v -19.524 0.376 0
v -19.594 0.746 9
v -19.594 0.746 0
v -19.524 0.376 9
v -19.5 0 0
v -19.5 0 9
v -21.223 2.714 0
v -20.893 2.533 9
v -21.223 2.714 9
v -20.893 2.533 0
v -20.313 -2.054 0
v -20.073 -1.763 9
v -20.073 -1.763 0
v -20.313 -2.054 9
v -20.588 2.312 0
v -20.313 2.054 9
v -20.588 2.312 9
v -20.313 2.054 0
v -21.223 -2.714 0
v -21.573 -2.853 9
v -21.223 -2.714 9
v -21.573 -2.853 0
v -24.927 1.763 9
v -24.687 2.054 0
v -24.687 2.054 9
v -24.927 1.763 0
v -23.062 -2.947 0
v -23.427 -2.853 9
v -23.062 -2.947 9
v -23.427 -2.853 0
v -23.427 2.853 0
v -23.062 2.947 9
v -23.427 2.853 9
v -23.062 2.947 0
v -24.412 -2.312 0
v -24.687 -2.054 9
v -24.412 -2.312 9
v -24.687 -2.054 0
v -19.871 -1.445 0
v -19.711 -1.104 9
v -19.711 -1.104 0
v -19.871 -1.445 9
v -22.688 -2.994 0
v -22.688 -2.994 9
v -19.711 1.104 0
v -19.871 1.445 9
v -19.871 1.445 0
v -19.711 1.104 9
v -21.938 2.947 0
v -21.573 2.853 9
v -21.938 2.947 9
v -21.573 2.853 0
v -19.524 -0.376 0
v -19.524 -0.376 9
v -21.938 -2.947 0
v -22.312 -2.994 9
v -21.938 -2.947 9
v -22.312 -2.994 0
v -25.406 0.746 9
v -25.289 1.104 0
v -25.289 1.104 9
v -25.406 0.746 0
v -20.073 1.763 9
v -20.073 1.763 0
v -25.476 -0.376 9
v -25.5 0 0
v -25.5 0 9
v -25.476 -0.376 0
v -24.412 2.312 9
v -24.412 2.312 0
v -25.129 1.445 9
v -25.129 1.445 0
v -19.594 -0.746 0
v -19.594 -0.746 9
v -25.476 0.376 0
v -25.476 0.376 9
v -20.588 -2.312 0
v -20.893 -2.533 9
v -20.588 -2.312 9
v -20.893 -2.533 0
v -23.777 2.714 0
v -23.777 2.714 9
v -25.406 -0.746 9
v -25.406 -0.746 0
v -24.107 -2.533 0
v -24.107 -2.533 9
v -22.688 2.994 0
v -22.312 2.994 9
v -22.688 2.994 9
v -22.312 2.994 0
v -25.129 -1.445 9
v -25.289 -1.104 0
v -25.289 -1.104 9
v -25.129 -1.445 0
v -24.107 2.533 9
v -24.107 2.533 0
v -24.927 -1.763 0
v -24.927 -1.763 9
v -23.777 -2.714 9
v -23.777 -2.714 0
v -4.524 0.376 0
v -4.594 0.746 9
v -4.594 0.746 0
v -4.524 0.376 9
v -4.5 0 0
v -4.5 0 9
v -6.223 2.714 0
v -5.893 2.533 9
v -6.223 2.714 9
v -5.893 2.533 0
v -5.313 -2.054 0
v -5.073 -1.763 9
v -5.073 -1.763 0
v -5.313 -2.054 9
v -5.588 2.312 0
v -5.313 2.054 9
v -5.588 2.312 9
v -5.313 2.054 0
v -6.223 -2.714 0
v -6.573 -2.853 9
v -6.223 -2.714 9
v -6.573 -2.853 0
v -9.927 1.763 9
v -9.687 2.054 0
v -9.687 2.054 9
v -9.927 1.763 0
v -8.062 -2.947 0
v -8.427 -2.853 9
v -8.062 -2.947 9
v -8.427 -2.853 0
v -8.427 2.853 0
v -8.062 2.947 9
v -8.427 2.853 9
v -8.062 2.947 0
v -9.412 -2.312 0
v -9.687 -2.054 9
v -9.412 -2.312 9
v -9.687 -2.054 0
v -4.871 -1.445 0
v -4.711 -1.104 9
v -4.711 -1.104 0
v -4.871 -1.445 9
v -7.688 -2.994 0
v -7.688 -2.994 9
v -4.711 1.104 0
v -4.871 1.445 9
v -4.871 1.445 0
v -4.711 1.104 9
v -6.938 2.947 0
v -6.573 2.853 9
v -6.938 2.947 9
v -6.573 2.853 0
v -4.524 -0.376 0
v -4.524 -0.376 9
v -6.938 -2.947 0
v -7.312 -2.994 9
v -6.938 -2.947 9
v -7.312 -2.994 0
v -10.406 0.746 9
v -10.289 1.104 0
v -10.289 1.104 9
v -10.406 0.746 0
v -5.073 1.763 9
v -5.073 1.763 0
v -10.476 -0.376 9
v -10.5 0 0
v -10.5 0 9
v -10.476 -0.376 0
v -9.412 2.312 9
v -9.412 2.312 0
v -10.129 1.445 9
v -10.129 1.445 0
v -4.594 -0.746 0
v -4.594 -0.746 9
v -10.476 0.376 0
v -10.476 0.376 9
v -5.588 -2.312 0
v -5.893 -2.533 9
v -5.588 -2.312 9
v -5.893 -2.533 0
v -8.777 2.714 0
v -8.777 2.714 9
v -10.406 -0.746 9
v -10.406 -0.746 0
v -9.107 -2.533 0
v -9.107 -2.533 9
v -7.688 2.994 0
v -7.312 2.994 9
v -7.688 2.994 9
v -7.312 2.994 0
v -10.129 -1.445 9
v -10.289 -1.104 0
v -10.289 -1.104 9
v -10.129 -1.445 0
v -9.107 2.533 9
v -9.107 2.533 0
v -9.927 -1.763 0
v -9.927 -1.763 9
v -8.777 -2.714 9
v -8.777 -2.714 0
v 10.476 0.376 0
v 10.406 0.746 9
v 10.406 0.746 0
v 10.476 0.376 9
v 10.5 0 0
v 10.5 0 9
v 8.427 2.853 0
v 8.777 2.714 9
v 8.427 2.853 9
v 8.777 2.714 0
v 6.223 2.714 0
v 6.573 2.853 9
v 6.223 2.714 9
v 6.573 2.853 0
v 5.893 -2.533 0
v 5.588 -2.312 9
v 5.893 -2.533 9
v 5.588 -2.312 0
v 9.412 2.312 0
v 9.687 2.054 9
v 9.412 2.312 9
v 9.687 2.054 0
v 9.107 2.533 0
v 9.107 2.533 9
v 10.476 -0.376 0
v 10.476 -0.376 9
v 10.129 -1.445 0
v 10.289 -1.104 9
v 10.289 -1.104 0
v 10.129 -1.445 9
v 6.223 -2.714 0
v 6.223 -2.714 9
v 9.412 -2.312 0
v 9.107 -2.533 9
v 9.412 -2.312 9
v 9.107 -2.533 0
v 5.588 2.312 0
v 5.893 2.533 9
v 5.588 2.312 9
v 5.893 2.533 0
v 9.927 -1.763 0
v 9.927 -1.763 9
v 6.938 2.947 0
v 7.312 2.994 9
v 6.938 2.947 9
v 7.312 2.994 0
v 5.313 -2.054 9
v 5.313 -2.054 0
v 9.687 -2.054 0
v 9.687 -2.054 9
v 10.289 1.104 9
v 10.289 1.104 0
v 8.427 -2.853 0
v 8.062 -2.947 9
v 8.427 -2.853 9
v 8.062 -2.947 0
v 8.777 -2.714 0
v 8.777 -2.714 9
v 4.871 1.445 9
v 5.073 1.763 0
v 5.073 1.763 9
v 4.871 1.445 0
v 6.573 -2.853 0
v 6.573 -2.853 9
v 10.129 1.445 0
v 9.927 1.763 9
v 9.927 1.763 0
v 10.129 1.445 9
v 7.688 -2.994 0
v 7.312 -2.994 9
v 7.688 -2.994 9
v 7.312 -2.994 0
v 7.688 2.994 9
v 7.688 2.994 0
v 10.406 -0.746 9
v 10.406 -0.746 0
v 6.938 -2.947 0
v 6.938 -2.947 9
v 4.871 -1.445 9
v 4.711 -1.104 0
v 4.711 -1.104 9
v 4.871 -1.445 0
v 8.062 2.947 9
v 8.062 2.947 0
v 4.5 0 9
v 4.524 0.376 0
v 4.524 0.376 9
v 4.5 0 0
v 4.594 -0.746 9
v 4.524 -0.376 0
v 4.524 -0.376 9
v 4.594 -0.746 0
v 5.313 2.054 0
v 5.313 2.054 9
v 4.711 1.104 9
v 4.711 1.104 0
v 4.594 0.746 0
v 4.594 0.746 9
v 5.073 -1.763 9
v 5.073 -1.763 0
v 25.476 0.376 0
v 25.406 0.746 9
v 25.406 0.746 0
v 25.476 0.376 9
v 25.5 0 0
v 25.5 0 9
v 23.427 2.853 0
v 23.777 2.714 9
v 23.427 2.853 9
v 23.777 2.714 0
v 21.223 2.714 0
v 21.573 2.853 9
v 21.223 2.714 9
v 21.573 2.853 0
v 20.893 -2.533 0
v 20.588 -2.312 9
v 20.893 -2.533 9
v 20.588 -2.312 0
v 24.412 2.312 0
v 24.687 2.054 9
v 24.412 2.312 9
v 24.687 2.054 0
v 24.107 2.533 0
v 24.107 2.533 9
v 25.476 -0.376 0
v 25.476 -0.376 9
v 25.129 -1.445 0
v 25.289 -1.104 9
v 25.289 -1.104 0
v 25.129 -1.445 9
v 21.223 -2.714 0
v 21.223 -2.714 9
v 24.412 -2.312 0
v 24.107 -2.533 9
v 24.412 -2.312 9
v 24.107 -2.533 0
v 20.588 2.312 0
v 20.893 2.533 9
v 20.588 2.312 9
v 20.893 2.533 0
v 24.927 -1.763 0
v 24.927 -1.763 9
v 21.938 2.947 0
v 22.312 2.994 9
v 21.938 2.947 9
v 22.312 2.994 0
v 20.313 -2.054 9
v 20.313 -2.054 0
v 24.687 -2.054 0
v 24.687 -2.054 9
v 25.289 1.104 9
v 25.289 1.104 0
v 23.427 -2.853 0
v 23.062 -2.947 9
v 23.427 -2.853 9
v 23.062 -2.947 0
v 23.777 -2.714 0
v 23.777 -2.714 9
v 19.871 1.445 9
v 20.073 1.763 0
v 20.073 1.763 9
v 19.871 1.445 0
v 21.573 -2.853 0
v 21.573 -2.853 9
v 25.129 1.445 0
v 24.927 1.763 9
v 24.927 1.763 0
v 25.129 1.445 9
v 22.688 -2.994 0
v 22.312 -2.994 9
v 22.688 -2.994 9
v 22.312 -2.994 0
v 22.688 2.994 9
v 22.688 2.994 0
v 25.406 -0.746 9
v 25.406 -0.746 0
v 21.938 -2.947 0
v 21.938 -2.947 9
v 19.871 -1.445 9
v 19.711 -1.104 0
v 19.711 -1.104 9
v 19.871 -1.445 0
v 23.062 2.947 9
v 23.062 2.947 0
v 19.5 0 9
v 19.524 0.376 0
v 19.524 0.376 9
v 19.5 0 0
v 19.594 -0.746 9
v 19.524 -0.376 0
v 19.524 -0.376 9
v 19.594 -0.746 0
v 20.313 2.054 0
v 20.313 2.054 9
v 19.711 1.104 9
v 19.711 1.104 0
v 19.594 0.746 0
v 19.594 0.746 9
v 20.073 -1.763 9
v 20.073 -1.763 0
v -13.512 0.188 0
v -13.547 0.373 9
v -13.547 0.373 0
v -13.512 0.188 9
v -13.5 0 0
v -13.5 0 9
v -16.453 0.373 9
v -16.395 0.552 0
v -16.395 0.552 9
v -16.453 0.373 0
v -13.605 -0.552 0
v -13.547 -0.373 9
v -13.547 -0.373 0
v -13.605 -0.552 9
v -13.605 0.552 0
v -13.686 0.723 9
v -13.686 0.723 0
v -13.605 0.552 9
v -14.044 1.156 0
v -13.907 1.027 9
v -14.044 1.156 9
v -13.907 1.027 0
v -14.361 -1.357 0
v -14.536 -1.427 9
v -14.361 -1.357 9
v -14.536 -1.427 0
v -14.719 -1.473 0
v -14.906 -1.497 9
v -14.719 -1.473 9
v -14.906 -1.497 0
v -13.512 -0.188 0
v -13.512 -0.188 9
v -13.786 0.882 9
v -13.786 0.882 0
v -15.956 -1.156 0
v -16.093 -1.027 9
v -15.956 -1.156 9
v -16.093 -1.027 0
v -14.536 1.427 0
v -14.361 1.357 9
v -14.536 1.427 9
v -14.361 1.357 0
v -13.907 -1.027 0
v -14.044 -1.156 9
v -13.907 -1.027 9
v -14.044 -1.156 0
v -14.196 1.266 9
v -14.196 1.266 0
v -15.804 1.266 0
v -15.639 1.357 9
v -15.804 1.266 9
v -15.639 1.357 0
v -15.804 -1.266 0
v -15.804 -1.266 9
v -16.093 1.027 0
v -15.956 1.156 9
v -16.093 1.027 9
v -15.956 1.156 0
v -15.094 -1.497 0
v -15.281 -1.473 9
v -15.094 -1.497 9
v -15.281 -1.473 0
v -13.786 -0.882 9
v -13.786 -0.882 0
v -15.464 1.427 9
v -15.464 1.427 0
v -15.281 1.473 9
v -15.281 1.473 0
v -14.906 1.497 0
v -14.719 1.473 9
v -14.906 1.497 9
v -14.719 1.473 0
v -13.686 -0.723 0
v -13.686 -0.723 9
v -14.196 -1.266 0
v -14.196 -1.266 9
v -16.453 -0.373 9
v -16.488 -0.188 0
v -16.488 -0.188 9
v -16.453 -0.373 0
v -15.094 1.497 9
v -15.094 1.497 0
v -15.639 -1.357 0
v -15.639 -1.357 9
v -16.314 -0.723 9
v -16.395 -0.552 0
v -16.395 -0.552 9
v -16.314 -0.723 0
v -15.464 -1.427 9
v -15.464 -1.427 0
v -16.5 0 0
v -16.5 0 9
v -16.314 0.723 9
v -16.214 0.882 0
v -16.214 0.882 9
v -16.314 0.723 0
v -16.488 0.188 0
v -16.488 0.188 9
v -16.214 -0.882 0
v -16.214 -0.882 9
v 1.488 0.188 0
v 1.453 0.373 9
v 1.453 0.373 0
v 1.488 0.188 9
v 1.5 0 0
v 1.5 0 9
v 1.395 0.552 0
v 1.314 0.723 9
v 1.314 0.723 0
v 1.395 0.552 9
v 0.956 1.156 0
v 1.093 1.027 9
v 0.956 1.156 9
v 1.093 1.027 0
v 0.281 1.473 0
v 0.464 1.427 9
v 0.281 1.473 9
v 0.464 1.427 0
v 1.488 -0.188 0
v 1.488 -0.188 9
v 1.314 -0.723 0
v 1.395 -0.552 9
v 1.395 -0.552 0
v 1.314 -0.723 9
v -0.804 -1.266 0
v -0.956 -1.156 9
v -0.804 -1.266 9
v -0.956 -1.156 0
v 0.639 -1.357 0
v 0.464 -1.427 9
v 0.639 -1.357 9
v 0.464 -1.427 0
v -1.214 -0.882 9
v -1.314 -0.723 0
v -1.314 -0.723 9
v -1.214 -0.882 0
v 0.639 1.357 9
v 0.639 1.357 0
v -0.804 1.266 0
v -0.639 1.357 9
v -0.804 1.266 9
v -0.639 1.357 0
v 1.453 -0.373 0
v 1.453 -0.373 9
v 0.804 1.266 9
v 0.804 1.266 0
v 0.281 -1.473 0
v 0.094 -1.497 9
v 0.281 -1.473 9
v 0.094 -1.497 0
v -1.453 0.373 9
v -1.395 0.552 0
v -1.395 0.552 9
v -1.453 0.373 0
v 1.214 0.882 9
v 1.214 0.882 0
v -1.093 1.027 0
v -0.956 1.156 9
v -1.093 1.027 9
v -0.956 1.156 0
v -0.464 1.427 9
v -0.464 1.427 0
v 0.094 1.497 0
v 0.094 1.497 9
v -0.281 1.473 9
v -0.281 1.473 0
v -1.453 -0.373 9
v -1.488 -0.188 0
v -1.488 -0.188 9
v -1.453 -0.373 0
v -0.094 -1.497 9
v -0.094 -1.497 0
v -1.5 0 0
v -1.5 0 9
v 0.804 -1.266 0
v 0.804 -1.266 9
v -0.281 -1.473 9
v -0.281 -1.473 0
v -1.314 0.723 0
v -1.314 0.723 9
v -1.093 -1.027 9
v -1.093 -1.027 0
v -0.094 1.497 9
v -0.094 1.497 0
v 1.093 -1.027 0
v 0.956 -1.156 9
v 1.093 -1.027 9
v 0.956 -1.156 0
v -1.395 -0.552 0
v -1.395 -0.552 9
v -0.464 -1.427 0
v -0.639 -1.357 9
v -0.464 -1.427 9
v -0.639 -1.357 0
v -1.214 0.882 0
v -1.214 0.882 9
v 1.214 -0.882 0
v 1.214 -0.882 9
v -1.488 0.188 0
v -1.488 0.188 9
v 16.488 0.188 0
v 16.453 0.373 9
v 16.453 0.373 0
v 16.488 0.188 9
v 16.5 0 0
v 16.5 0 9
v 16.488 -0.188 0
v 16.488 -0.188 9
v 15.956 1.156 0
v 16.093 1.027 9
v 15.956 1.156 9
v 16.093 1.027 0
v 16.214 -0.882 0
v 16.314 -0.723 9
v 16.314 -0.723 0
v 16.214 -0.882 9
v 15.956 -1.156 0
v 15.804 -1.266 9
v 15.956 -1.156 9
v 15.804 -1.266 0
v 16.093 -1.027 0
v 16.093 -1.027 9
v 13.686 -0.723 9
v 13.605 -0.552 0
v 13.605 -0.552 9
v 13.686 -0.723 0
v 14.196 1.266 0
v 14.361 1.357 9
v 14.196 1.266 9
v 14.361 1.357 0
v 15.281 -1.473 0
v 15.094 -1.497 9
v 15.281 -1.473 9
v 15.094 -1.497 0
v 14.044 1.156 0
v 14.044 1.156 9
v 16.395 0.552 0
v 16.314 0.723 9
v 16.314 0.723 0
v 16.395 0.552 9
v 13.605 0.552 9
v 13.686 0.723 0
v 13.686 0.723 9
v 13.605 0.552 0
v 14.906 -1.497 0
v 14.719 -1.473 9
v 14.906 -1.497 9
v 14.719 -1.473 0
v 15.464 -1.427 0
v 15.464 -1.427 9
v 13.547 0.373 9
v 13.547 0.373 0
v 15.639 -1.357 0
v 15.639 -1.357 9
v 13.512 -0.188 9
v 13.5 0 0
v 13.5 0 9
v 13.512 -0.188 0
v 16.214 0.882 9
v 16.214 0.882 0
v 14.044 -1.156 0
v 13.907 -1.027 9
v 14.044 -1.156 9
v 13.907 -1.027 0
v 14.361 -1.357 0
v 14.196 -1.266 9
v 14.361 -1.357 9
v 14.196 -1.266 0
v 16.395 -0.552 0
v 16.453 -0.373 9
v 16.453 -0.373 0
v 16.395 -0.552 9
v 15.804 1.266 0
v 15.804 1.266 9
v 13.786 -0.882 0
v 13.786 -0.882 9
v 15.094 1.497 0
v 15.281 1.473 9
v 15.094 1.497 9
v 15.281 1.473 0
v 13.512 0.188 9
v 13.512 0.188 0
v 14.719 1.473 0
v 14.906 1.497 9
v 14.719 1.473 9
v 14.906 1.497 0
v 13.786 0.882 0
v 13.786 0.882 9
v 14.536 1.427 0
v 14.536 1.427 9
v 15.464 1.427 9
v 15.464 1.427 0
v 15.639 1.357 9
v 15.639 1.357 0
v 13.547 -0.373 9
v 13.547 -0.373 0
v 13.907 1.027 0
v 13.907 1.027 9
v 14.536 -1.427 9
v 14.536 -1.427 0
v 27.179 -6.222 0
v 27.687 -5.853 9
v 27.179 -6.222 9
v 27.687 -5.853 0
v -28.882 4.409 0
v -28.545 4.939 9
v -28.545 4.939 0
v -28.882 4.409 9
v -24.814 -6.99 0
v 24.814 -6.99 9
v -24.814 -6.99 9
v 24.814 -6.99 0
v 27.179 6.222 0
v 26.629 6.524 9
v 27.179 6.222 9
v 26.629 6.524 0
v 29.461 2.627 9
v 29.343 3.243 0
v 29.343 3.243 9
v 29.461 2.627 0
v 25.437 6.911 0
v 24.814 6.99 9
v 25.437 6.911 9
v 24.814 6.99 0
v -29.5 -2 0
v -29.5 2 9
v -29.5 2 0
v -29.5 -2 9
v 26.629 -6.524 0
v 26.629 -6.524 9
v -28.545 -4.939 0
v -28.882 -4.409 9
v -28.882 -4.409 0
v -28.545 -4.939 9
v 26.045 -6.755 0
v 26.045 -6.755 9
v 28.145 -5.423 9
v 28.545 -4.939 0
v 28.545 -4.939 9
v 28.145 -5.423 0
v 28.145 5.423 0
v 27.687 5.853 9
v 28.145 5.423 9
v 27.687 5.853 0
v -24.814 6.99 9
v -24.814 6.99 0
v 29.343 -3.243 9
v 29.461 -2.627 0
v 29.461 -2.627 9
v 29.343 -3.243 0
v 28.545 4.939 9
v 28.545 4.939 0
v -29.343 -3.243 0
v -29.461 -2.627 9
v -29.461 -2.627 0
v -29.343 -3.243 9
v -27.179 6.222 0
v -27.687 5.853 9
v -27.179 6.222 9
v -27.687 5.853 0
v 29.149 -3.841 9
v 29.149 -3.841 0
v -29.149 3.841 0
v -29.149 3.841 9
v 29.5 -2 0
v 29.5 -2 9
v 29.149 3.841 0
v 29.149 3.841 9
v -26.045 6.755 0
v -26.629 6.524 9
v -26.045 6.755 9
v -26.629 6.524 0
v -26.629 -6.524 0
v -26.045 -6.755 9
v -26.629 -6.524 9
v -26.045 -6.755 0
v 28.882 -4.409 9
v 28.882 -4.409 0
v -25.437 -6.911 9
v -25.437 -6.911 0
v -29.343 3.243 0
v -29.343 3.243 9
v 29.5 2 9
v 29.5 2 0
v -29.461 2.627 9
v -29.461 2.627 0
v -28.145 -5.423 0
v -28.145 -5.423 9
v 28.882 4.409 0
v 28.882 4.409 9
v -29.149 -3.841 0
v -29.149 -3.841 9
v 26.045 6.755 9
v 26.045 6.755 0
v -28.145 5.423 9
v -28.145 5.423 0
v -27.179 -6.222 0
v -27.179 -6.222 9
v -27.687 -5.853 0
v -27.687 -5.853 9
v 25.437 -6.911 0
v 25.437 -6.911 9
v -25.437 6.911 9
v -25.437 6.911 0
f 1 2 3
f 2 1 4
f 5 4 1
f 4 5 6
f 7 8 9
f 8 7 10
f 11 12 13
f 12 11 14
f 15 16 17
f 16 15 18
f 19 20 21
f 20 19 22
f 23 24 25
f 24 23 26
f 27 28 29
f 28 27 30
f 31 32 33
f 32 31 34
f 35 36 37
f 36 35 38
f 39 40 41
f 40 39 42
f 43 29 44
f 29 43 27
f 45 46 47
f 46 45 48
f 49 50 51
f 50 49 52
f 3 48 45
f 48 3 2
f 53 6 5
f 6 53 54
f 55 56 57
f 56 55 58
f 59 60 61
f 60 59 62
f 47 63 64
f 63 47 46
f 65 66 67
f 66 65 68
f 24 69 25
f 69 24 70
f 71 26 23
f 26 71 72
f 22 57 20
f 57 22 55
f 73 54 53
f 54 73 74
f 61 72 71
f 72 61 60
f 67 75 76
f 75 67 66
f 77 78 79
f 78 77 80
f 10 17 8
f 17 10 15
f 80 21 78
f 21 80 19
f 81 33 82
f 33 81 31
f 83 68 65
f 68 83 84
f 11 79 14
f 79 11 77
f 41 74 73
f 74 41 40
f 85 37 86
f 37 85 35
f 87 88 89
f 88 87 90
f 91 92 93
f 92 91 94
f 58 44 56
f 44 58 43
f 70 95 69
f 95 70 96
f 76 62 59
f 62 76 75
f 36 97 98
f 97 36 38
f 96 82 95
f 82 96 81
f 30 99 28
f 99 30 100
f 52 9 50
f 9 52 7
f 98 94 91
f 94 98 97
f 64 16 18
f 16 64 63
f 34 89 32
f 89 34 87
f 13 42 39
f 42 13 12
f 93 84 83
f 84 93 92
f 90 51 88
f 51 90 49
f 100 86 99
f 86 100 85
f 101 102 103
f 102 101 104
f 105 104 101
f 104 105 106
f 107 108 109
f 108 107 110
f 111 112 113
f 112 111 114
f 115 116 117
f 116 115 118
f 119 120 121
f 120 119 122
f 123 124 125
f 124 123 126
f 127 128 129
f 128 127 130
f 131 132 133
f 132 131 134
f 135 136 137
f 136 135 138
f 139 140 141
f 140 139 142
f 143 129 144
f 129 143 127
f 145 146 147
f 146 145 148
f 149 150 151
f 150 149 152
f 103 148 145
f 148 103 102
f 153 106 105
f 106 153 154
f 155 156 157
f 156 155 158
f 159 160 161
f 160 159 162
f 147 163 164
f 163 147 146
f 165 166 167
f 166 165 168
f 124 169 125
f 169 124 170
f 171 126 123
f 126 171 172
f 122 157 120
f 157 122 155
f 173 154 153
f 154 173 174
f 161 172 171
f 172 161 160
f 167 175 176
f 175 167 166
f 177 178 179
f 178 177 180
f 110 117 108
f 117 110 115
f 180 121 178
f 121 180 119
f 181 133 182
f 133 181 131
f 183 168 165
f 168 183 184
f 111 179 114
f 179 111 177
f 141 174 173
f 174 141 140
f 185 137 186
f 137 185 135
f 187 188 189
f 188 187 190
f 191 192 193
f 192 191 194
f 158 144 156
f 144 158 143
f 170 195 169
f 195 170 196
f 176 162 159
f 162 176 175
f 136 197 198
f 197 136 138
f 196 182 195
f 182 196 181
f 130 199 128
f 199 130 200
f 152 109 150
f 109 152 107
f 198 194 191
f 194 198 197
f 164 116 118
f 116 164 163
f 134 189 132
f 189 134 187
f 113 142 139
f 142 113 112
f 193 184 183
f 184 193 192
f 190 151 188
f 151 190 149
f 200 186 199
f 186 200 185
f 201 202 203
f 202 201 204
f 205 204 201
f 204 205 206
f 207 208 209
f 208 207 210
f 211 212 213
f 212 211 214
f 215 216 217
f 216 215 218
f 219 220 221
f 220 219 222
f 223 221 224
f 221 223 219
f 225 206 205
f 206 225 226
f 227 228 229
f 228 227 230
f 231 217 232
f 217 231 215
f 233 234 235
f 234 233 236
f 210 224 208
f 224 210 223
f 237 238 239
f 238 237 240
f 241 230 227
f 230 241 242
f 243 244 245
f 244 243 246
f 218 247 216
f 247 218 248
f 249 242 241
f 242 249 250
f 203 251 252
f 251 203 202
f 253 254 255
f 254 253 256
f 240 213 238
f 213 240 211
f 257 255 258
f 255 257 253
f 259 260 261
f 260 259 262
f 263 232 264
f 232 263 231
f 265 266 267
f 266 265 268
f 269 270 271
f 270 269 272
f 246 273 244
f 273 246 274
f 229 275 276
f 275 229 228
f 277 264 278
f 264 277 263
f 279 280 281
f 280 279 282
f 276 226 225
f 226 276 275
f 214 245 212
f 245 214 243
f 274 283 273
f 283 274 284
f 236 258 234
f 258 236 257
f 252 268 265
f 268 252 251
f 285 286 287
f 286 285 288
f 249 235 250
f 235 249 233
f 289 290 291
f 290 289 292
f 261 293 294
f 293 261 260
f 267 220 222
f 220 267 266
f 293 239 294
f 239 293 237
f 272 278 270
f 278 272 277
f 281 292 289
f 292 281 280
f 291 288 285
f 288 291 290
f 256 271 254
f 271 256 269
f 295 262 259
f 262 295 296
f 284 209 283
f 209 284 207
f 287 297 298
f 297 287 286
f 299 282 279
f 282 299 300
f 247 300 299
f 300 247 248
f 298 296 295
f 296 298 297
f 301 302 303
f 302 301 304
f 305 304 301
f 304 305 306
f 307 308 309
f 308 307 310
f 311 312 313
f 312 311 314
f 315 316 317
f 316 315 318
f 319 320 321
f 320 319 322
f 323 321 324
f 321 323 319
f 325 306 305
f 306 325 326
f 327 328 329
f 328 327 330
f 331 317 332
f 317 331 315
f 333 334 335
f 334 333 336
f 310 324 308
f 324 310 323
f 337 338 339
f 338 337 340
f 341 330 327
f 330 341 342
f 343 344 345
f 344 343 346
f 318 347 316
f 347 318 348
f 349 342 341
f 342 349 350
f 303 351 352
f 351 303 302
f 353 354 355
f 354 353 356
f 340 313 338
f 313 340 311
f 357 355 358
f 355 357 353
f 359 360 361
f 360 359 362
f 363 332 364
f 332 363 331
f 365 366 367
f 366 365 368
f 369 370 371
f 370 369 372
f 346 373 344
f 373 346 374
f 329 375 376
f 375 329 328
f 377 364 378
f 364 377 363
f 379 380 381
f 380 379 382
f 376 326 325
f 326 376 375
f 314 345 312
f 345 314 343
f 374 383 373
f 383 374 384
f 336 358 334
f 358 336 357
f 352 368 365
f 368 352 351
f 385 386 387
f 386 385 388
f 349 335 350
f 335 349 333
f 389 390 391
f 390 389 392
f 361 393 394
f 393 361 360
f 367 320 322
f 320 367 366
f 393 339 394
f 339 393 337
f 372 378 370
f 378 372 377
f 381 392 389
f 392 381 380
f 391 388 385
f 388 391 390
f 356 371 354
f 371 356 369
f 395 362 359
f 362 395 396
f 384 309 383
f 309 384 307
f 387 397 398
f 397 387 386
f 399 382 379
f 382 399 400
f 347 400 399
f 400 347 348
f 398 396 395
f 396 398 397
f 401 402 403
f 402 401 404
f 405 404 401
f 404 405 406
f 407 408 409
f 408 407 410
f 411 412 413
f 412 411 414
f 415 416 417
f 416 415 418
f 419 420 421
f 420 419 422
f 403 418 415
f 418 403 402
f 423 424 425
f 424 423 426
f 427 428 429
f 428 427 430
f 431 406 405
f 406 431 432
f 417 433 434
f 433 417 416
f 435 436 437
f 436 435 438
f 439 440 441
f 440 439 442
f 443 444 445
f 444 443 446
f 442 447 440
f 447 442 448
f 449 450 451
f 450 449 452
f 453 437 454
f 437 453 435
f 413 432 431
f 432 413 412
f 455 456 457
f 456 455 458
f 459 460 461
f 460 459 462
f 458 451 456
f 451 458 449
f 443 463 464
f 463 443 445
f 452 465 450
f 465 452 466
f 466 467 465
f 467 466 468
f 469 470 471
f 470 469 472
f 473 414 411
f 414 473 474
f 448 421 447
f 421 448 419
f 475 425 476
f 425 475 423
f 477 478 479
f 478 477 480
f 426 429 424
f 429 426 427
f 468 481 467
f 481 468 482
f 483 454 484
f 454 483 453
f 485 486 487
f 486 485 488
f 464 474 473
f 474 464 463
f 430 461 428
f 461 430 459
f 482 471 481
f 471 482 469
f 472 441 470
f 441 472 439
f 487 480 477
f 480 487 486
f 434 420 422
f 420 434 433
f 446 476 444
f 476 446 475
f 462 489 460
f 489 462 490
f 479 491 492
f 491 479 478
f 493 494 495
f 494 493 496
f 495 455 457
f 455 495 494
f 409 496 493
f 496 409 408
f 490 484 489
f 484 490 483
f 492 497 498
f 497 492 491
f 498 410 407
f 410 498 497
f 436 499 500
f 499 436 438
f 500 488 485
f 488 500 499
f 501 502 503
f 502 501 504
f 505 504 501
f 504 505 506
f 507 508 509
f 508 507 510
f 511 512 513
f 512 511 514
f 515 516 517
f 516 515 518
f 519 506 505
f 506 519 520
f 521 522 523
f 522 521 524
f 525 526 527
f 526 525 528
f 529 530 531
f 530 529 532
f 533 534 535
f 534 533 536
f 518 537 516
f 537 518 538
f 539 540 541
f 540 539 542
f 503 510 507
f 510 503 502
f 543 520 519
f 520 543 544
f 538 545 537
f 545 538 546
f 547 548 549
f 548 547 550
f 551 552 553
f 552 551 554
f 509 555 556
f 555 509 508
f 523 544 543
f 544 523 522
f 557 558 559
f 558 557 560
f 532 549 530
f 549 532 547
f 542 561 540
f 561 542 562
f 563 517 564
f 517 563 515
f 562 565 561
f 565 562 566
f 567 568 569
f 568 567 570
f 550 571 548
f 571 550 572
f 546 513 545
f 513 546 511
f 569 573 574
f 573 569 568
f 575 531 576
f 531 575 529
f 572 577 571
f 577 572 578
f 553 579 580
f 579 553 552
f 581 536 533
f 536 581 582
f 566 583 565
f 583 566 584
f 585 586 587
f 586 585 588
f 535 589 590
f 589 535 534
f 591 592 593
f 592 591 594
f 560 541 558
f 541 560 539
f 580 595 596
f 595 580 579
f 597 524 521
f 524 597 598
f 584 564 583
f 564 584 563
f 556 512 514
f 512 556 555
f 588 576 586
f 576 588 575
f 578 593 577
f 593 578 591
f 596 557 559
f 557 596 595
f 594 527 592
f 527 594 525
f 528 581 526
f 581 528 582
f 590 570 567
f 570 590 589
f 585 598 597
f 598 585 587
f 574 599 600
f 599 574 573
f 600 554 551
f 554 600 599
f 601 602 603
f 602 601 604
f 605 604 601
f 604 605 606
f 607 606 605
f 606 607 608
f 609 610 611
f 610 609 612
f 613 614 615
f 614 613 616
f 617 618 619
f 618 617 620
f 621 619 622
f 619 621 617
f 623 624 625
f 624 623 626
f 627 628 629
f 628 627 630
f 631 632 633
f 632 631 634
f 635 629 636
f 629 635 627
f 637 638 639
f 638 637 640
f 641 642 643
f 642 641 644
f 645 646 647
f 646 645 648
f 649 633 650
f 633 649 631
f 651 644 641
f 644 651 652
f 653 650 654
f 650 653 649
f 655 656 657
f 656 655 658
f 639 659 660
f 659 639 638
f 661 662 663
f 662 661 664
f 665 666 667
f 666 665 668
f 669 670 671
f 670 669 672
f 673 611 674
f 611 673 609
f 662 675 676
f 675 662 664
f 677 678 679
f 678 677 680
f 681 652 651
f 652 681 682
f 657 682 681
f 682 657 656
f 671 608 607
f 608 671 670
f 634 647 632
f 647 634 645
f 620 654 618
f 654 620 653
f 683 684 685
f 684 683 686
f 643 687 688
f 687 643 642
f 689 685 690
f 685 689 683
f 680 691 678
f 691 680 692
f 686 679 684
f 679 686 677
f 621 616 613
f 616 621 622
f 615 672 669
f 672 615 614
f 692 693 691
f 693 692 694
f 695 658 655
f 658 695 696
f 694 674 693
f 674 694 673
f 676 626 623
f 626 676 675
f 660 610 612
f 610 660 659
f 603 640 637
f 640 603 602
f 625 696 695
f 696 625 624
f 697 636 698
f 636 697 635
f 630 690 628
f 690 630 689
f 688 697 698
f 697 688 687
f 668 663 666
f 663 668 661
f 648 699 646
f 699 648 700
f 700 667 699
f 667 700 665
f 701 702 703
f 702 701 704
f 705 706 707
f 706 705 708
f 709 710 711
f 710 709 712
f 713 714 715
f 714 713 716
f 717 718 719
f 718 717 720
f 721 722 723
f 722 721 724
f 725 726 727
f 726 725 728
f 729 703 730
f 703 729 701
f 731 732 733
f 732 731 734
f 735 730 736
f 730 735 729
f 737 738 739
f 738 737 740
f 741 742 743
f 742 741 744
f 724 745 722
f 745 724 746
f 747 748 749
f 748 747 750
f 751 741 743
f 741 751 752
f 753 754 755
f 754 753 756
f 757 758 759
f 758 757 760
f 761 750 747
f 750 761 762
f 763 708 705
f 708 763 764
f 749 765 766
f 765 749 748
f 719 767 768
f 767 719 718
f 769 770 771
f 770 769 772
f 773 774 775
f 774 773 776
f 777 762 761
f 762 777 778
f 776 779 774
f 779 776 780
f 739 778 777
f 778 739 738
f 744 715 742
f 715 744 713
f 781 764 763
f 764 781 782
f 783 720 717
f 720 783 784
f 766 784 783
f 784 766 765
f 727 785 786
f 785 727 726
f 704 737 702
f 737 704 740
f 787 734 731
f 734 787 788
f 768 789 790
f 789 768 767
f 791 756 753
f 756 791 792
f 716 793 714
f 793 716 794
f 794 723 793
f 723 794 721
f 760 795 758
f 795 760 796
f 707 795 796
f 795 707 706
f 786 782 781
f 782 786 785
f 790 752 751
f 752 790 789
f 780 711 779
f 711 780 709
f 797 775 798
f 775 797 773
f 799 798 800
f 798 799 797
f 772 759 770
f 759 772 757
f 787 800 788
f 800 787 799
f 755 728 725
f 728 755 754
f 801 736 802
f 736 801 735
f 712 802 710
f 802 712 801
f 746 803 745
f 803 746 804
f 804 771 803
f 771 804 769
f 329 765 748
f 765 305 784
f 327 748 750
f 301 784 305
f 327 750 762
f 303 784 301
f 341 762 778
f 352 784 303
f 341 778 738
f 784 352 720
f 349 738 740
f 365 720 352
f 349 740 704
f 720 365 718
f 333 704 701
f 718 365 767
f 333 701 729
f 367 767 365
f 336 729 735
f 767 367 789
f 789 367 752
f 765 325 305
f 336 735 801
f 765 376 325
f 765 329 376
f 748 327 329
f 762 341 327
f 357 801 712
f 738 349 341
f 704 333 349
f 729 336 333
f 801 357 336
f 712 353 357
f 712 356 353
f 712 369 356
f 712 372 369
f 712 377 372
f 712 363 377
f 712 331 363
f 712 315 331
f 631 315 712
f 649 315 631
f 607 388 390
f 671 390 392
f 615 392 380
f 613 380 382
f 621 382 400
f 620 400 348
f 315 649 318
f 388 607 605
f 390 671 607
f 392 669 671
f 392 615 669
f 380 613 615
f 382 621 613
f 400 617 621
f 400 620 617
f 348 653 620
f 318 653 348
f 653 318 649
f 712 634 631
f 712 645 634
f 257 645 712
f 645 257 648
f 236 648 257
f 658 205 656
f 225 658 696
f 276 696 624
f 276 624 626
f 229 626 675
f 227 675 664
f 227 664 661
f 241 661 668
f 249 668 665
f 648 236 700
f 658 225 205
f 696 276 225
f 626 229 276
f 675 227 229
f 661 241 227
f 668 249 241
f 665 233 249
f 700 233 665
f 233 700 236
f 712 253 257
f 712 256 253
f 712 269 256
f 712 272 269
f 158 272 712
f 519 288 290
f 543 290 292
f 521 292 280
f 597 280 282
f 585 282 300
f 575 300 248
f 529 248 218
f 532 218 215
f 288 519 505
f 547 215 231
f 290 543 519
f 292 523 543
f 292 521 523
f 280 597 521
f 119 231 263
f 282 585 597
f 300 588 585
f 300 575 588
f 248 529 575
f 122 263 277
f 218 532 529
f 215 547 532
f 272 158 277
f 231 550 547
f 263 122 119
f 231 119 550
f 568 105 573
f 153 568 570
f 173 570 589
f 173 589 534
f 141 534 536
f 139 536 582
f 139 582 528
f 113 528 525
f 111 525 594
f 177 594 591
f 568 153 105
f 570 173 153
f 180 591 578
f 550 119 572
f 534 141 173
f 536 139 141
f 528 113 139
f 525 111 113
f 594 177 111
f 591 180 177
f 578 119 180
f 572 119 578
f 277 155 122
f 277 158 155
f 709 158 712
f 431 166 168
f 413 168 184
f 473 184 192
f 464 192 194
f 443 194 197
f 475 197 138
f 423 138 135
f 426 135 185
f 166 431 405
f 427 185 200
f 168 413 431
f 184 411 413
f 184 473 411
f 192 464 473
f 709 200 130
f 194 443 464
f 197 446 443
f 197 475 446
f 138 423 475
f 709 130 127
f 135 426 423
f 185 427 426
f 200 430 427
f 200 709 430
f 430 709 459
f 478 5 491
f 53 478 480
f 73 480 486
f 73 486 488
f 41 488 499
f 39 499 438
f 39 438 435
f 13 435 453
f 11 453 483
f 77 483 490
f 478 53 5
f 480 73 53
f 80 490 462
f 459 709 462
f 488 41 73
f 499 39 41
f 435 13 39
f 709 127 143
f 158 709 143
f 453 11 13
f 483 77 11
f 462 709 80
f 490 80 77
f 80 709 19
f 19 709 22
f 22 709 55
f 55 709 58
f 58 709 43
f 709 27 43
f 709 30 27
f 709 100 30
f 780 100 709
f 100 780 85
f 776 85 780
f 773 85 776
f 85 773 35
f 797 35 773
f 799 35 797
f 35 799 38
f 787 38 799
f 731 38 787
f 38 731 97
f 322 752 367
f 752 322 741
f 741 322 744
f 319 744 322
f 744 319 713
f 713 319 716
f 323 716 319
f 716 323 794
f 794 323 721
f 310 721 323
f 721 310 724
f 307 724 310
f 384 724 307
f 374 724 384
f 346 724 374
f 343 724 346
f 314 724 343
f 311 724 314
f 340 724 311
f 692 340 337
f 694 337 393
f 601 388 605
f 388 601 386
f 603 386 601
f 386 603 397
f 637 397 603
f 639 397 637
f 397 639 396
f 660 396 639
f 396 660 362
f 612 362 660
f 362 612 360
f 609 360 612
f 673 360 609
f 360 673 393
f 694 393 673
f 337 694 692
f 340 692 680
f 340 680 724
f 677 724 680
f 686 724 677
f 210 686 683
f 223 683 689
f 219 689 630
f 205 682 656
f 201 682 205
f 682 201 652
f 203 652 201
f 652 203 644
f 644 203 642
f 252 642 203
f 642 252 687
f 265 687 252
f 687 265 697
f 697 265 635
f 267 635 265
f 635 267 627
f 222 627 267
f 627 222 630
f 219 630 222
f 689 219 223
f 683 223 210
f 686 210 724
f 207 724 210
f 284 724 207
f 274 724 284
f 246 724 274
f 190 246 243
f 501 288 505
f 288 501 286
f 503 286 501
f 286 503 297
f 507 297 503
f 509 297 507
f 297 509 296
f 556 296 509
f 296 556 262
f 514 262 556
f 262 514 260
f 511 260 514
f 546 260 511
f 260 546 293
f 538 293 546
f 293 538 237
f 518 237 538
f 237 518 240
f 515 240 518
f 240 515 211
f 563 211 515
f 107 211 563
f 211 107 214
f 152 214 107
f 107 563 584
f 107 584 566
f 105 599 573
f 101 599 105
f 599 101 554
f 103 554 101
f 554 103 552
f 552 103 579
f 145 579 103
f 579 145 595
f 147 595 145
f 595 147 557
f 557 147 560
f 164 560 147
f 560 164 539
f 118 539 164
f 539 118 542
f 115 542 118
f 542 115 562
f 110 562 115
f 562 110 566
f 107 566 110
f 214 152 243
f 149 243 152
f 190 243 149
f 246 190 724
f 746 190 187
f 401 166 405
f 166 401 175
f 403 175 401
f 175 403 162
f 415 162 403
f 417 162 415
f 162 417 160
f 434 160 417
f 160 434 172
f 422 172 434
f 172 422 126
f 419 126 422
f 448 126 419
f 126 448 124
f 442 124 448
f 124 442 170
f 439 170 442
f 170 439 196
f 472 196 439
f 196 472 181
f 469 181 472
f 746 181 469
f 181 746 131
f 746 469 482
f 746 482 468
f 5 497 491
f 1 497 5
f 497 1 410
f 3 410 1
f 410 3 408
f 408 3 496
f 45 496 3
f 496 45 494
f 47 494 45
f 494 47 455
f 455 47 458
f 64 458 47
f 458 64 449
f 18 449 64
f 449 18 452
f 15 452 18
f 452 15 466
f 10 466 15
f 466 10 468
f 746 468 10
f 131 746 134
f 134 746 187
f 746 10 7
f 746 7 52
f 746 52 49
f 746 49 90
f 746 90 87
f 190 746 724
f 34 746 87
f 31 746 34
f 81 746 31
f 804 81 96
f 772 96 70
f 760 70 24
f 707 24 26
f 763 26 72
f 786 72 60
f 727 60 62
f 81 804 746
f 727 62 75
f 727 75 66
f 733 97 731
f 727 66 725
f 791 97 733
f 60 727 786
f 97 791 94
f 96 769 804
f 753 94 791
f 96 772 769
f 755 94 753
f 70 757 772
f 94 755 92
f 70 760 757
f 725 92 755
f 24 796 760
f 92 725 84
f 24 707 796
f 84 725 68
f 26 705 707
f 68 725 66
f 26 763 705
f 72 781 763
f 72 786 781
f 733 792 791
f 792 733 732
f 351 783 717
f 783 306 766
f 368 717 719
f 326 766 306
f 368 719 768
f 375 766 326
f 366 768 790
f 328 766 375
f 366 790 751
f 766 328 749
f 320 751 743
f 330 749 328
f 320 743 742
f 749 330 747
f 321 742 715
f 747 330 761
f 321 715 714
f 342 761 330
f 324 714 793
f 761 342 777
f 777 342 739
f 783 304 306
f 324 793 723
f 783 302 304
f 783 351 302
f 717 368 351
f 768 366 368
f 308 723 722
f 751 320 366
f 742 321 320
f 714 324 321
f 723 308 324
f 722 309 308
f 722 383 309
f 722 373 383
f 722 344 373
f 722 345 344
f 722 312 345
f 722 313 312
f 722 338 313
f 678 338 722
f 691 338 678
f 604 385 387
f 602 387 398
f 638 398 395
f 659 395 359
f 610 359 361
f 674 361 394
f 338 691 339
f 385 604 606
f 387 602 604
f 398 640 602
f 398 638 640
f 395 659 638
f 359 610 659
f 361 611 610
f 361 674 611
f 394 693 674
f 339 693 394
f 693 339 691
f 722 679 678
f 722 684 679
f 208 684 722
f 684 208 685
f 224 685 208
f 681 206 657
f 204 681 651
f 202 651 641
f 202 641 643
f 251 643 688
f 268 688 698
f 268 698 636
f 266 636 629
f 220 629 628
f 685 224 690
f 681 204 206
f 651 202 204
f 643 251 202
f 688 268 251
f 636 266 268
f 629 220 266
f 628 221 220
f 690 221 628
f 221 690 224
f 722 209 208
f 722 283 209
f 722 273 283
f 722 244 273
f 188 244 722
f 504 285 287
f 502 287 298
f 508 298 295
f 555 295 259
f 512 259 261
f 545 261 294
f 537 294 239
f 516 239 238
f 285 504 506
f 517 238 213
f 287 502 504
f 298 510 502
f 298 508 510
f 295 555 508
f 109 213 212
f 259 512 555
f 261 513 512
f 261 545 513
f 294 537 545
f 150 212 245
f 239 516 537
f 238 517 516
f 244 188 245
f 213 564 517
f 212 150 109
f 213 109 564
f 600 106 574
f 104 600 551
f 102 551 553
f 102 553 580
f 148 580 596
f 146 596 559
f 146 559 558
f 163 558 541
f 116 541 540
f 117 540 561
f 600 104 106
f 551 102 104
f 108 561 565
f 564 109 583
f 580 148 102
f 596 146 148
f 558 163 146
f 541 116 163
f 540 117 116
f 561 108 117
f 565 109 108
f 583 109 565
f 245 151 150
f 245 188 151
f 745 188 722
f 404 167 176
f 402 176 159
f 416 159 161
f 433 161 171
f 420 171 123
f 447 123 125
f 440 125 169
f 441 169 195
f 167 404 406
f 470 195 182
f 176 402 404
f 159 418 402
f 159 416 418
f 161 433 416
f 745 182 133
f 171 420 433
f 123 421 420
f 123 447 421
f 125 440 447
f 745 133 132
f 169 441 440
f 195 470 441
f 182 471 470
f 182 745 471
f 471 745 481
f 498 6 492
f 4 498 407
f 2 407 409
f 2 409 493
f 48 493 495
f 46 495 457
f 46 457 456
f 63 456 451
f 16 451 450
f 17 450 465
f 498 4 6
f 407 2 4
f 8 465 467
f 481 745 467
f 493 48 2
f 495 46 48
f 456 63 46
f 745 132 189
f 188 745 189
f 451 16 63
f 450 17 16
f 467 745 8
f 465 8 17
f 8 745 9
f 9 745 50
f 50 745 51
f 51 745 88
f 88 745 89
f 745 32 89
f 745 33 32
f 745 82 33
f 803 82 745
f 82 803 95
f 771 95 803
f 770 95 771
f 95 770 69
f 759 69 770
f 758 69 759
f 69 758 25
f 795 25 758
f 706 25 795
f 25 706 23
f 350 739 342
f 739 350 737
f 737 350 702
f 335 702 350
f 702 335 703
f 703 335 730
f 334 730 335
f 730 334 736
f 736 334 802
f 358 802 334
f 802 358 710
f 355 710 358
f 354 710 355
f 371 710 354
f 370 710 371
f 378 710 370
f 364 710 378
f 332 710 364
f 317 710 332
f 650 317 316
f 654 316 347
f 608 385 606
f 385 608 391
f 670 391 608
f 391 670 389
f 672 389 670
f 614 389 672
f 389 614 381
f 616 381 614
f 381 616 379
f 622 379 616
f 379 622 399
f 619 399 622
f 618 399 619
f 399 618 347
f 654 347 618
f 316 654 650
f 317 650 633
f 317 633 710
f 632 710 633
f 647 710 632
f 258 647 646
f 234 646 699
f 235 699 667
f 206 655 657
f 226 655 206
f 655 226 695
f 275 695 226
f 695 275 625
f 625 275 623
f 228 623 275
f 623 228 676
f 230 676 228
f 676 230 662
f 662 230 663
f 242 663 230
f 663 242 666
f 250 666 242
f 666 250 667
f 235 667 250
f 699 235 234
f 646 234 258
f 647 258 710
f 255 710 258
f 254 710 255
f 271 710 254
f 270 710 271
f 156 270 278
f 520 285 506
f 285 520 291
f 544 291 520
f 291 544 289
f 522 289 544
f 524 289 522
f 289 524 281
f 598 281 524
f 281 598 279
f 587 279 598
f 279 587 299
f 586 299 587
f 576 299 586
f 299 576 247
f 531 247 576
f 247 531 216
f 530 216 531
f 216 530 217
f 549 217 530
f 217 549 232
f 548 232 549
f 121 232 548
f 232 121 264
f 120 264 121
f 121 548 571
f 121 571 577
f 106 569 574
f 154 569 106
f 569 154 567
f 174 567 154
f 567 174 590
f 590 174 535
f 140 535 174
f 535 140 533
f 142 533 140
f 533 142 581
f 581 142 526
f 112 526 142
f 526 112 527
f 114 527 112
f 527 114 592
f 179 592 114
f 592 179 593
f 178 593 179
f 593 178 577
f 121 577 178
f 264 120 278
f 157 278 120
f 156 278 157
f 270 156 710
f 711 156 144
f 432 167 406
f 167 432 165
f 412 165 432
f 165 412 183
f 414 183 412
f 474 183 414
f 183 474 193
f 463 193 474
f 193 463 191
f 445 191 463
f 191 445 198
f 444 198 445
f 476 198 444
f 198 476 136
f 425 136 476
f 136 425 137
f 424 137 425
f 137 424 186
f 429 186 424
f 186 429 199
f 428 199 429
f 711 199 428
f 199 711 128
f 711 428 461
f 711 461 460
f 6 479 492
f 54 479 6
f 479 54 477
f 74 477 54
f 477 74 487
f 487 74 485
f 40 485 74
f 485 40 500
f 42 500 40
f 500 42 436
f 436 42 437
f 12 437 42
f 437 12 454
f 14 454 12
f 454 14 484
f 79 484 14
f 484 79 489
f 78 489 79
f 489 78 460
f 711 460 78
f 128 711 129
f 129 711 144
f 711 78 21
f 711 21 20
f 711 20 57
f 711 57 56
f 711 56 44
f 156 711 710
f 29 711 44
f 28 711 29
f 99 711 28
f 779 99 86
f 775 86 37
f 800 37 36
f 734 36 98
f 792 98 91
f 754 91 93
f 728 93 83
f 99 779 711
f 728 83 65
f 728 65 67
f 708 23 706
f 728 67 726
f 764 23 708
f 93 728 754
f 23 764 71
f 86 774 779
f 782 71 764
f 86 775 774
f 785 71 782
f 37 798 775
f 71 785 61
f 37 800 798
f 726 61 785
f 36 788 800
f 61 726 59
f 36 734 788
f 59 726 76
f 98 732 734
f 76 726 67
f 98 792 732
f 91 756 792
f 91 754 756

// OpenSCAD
$fn = 50;


difference() {
	union() {
		*color(alpha = 1.0000000000, c = "gray") {
			translate(v = [0, 7, 0]) {
				linear_extrude(height = 1) {
					text(font = "Arial:style=Bold", halign = "center", size = 4.5000000000, text = "COMMENT plate main", valign = "center");
				}
			}
		}
		*color(alpha = 1.0000000000, c = "gray") {
			translate(v = [0, 14, 0]) {
				linear_extrude(height = 1) {
					text(font = "Arial:style=Bold", halign = "center", size = 4.5000000000, text = "COMMENT description oobb_plate_shape_p_type_9_depth_4_width_1_height_9_thickness_true_both_holes", valign = "center");
				}
			}
		}
		hull() {
			translate(v = [-24.5000000000, 2.0000000000, 0]) {
				cylinder(h = 9, r = 5);
			}
			translate(v = [24.5000000000, 2.0000000000, 0]) {
				cylinder(h = 9, r = 5);
			}
			translate(v = [-24.5000000000, -2.0000000000, 0]) {
				cylinder(h = 9, r = 5);
			}
			translate(v = [24.5000000000, -2.0000000000, 0]) {
				cylinder(h = 9, r = 5);
			}
		}
	}
	union() {
		*color(alpha = 1.0000000000, c = "gray") {
			translate(v = [0, 7, 0]) {
				linear_extrude(height = 1) {
					text(font = "Arial:style=Bold", halign = "center", size = 4.5000000000, text = "COMMENT holes main", valign = "center");
				}
			}
		}
		*color(alpha = 1.0000000000, c = "gray") {
			translate(v = [0, 14, 0]) {
				linear_extrude(height = 1) {
					text(font = "Arial:style=Bold", halign = "center", size = 4.5000000000, text = "COMMENT description oobb_holes_shape_n_type_4_width_1_height_9_thickness_true_both_holes", valign = "center");
				}
			}
		}
		translate(v = [-22.5000000000, 0.0000000000, 0]) {
			translate(v = [0, 0, -50]) {
				cylinder(h = 100, r = 3.0000000000);
			}
		}
		translate(v = [-7.5000000000, 0.0000000000, 0]) {
			translate(v = [0, 0, -50]) {
				cylinder(h = 100, r = 3.0000000000);
			}
		}
		translate(v = [7.5000000000, 0.0000000000, 0]) {
			translate(v = [0, 0, -50]) {
				cylinder(h = 100, r = 3.0000000000);
			}
		}
		translate(v = [22.5000000000, 0.0000000000, 0]) {
			translate(v = [0, 0, -50]) {
				cylinder(h = 100, r = 3.0000000000);
			}
		}
		translate(v = [-22.5000000000, 0.0000000000, 0]) {
			translate(v = [0, 0, -50]) {
				cylinder(h = 100, r = 1.5000000000);
			}
		}
		translate(v = [-15.0000000000, 0.0000000000, 0]) {
			translate(v = [0, 0, -50]) {
				cylinder(h = 100, r = 1.5000000000);
			}
		}
		translate(v = [-7.5000000000, 0.0000000000, 0]) {
			translate(v = [0, 0, -50]) {
				cylinder(h = 100, r = 1.5000000000);
			}
		}
		translate(v = [0, 0, -50]) {
			cylinder(h = 100, r = 1.5000000000);
		}
		translate(v = [7.5000000000, 0.0000000000, 0]) {
			translate(v = [0, 0, -50]) {
				cylinder(h = 100, r = 1.5000000000);
			}
		}
		translate(v = [15.0000000000, 0.0000000000, 0]) {
			translate(v = [0, 0, -50]) {
				cylinder(h = 100, r = 1.5000000000);
			}
		}
		translate(v = [22.5000000000, 0.0000000000, 0]) {
			translate(v = [0, 0, -50]) {
				cylinder(h = 100, r = 1.5000000000);
			}
		}
	}
}
